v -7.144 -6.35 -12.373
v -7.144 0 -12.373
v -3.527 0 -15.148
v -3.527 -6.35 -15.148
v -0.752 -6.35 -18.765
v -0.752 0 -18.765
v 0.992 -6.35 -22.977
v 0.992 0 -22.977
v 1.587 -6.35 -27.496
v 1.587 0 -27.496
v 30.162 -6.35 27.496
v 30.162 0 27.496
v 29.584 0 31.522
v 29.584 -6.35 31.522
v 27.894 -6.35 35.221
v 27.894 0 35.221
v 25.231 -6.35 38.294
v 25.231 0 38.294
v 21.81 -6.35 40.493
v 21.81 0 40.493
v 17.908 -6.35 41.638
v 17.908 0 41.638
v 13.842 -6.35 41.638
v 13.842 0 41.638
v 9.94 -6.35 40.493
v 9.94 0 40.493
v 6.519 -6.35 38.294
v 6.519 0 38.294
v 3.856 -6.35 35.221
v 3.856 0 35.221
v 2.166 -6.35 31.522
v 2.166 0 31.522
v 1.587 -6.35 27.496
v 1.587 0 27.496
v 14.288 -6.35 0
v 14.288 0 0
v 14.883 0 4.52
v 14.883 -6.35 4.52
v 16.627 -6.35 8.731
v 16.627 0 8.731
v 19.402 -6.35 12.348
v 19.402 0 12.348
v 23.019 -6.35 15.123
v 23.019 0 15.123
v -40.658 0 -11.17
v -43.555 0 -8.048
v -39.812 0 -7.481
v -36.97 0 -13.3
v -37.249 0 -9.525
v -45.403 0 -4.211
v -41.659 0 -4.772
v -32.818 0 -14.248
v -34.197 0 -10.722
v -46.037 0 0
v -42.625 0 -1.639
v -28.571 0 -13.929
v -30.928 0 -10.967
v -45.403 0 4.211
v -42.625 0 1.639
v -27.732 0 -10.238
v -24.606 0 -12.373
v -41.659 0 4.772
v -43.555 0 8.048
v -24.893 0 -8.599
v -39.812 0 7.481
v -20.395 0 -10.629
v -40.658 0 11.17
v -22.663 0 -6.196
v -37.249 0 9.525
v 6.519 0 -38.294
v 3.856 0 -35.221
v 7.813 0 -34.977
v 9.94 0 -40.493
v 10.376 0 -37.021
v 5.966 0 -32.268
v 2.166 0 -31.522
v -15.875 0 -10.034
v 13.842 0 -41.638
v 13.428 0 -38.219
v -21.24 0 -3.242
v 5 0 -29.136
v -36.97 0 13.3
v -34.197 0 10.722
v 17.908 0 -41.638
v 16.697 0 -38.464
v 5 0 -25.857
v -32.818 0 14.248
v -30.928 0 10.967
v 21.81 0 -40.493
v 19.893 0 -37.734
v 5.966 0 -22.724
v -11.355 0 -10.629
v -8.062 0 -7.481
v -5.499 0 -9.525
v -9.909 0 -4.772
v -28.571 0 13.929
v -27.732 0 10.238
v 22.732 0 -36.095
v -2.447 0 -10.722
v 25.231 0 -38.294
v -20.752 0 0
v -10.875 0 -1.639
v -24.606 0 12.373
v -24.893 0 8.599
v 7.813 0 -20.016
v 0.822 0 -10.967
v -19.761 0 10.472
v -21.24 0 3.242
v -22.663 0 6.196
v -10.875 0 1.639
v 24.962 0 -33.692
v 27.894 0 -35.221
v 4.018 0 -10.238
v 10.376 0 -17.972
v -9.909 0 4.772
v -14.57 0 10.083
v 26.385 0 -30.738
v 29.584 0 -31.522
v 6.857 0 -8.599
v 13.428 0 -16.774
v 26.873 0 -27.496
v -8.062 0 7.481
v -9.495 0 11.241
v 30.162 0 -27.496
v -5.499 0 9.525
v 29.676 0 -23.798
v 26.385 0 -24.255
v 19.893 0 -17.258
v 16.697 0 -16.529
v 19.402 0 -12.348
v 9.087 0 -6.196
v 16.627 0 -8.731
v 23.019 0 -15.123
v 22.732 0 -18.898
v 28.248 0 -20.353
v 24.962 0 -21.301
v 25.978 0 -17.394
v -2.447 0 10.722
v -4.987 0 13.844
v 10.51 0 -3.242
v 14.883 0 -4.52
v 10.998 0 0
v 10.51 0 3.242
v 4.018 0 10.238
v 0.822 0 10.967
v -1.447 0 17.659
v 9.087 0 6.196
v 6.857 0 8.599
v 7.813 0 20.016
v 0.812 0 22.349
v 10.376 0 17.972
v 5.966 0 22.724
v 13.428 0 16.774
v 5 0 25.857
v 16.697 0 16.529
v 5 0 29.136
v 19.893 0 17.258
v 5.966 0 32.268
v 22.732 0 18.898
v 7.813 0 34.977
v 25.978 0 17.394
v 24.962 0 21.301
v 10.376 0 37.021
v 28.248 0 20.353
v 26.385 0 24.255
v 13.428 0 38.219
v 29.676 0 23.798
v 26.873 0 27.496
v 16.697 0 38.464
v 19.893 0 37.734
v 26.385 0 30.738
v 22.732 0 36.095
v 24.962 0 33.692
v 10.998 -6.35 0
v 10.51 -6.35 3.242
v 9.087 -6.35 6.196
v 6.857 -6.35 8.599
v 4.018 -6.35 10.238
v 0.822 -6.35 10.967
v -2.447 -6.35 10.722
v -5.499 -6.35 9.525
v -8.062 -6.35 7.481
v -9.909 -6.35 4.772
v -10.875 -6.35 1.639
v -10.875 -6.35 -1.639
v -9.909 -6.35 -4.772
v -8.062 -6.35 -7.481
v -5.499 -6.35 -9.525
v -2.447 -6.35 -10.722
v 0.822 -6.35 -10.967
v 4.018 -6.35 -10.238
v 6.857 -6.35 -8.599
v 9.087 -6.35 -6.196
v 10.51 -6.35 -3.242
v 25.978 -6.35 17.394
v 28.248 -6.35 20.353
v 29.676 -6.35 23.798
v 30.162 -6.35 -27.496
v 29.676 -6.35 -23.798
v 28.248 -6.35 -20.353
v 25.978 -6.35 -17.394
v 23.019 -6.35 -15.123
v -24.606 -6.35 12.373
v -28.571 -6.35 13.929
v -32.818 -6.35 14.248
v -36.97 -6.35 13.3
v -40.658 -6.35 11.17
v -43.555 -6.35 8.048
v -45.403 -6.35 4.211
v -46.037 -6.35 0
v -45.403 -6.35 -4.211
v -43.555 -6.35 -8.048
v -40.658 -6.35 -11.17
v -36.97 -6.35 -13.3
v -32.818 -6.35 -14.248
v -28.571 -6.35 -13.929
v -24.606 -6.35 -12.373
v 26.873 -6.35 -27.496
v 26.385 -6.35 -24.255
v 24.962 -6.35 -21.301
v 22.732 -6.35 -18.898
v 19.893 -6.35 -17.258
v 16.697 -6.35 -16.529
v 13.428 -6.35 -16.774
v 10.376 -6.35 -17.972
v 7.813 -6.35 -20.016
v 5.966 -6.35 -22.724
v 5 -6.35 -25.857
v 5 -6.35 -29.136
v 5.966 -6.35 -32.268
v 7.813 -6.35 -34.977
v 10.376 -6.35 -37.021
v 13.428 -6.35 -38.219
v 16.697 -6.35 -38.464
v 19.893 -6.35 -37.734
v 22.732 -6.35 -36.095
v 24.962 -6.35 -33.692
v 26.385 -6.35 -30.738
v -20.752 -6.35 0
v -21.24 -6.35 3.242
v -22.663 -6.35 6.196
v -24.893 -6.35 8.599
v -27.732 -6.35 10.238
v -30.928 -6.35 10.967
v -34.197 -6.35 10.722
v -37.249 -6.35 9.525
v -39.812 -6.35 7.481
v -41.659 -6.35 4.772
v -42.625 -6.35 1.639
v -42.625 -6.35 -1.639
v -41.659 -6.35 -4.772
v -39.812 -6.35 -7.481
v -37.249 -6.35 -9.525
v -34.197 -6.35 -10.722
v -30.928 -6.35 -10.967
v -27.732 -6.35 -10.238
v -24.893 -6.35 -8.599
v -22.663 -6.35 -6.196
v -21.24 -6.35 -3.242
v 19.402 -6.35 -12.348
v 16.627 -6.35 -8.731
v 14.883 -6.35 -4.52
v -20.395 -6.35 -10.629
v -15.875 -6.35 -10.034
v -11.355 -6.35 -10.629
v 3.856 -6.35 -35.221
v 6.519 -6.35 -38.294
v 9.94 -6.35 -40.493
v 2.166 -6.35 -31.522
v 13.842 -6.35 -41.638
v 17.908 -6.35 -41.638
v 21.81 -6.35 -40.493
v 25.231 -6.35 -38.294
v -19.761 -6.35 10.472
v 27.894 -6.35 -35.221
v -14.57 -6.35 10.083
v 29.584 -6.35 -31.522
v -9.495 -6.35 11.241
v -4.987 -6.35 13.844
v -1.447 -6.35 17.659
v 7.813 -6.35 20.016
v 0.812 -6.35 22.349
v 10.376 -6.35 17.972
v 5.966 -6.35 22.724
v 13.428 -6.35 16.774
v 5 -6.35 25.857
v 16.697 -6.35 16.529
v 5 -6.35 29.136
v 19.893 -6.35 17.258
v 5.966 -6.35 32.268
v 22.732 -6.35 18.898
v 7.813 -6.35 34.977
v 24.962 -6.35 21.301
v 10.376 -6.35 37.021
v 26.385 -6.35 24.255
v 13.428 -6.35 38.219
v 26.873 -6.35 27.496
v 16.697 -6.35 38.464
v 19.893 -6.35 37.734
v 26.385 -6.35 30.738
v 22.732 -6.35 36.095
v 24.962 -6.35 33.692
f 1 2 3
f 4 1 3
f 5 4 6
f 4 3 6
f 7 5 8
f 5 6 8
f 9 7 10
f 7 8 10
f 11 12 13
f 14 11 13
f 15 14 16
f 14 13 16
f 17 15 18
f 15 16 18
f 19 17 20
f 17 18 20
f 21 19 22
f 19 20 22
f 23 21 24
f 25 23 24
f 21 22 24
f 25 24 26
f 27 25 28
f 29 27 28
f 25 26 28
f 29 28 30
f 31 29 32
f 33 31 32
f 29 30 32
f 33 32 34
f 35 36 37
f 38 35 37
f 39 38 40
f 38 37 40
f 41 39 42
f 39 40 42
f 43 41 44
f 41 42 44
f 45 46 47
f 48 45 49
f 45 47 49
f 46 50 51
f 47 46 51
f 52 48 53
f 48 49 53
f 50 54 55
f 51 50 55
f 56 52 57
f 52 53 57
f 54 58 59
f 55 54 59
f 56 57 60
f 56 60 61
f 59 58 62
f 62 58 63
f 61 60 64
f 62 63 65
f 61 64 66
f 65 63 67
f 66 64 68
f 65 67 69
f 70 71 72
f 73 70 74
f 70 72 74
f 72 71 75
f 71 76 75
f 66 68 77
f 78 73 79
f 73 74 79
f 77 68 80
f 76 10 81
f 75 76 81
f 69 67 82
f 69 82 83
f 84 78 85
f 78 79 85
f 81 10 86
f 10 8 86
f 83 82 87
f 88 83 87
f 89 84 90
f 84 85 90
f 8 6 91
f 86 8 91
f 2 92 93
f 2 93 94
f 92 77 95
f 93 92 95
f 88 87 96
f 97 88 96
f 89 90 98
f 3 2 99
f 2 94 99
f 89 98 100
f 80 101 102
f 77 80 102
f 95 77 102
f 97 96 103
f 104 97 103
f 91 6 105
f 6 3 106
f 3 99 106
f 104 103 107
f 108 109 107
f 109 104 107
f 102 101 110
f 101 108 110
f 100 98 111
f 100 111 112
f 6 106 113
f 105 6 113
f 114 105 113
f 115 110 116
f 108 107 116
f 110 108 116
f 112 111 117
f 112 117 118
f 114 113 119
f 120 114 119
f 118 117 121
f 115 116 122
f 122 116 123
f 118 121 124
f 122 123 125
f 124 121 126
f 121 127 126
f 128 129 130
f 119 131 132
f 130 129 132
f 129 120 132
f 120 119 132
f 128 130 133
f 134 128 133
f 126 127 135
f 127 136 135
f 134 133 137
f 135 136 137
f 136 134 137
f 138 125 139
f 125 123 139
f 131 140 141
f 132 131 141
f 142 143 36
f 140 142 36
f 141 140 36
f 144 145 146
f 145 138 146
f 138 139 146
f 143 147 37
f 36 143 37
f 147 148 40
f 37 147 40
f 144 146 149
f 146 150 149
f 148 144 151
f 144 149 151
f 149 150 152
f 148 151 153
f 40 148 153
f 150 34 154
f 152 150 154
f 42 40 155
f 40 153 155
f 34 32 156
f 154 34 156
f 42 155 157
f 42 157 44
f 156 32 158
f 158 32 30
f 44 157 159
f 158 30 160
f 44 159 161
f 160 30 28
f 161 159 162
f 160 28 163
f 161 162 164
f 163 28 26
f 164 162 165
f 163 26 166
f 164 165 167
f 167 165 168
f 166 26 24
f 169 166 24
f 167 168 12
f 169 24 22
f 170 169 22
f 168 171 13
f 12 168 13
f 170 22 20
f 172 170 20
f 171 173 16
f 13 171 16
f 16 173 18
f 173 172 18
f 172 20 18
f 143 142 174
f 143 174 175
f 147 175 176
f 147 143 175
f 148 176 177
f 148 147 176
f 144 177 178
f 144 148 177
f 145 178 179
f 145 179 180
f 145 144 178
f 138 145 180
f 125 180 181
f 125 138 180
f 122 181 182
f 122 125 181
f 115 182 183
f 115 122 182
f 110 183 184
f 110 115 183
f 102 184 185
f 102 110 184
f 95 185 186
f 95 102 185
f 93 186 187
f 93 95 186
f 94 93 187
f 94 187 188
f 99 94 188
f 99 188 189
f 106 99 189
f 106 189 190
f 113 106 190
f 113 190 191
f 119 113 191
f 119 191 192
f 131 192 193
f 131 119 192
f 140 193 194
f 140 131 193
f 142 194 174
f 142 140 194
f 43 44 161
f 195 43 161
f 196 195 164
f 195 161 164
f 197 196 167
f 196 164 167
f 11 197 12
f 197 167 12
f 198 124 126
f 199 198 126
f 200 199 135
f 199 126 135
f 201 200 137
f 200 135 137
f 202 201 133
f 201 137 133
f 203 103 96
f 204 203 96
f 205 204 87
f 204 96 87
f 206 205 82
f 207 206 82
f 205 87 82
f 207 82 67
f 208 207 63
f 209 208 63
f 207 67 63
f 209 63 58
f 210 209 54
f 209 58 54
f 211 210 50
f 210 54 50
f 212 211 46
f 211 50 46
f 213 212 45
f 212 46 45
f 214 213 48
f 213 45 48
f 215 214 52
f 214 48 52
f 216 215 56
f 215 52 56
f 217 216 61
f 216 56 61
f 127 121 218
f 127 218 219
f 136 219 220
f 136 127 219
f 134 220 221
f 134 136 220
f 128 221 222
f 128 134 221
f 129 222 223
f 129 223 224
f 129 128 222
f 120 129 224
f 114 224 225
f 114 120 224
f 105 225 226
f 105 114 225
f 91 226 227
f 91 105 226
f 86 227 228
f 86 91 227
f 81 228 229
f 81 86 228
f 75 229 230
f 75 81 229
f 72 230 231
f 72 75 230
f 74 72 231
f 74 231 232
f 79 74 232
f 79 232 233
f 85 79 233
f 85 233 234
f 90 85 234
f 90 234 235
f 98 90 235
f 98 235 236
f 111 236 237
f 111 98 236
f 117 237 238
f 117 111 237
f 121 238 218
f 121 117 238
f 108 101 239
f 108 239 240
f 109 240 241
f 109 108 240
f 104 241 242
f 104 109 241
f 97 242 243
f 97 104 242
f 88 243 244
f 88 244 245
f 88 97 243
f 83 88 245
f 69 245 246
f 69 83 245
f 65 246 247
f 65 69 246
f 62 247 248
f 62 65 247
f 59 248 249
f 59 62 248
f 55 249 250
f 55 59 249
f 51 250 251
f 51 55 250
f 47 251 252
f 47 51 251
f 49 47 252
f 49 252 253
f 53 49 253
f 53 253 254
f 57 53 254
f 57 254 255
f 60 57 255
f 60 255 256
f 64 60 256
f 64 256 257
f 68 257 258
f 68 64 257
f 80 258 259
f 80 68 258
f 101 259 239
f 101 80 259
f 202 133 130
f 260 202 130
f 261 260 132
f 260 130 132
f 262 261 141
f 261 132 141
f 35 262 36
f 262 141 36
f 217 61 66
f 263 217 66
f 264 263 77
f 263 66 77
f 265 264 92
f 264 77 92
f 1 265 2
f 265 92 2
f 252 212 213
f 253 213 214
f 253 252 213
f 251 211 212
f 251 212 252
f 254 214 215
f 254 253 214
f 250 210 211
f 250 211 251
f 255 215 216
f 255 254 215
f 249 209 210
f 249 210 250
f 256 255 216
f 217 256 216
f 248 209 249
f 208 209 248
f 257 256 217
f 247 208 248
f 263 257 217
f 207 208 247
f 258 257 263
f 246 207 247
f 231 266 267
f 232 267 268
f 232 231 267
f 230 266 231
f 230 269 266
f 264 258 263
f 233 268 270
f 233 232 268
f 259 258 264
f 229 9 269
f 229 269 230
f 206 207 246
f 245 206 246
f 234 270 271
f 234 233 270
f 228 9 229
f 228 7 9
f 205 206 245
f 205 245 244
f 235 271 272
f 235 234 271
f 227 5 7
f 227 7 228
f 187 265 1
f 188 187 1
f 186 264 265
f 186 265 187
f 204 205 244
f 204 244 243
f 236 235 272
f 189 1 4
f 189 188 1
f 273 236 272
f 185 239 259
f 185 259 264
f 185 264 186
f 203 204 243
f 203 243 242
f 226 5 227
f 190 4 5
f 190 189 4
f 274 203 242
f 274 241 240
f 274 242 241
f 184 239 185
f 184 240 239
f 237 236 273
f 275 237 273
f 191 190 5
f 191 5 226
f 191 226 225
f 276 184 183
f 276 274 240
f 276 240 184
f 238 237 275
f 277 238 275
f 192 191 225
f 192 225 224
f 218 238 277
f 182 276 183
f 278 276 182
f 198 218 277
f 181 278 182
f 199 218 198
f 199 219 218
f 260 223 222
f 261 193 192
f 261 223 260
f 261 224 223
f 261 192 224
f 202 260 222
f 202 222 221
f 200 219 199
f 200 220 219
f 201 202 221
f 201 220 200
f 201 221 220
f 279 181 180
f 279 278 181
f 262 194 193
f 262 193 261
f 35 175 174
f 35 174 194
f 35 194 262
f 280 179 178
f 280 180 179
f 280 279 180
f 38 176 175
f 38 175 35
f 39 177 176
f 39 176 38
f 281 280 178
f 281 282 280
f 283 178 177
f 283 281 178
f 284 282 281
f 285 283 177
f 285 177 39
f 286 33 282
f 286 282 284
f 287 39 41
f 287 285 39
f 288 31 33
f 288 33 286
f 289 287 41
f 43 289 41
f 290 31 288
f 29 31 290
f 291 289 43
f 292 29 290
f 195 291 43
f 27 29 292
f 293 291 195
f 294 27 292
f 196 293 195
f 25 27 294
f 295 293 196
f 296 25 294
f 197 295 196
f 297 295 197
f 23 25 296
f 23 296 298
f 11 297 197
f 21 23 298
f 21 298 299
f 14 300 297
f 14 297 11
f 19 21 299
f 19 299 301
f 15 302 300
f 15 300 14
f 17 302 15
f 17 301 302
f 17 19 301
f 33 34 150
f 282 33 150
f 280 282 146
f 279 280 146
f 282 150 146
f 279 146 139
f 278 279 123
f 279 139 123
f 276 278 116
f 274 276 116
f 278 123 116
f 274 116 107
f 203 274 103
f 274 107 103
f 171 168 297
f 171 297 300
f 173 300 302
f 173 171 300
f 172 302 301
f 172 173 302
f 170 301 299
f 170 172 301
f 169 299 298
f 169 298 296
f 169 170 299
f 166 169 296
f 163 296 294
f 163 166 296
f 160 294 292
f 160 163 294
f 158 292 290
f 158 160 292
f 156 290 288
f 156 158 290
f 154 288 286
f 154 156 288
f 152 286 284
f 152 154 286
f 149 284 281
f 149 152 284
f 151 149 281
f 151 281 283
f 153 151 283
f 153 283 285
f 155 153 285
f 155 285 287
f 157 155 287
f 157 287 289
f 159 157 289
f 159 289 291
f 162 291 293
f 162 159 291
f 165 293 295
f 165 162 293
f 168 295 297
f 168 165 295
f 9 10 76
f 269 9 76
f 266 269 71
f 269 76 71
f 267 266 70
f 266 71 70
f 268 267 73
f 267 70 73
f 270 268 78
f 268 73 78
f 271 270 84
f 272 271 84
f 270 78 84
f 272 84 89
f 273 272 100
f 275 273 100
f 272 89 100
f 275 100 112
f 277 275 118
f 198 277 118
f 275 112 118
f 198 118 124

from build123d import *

# Parameters (mm, degrees)
F0_R     = 10.9982
F1_DEPTH = 6.35


with BuildPart() as f1:
    # F0 (on Front) → F1 (new body)
    with BuildSketch(Plane.XZ):
        with BuildLine():
            ThreePointArc((-7.1437498937, -12.3733380179), (7.1437500531, -12.3733379259), (14.2875, 0))
            ThreePointArc((14.2875, 0), (7.1437499995, 12.3733379569), (-7.143750001, 12.373337956))
            ThreePointArc((-7.143750001, 12.373337956), (-14.2875, -6.19e-08), (-7.1437498937, -12.3733380179))
        make_face()
        Circle(F0_R, mode=Mode.SUBTRACT)
        with BuildLine():
            ThreePointArc((23.01875, -15.1229686136), (16.6270313864, -8.73125), (14.2875, 0))
            ThreePointArc((14.2875, 0), (7.1437500531, -12.3733379259), (-7.1437498937, -12.3733380179))
            ThreePointArc((-7.1437498937, -12.3733380179), (-0.7520313557, -18.7650566233), (1.5875, -27.4963065702))
            ThreePointArc((1.5875, -27.4963065702), (8.73125, -15.1229686136), (23.01875, -15.1229686136))
        make_face()
        with BuildLine():
            ThreePointArc((-7.143750001, 12.373337956), (7.1437499995, 12.3733379569), (14.2875, 0))
            ThreePointArc((14.2875, 0), (16.6270313864, 8.73125), (23.01875, 15.1229686136))
            ThreePointArc((23.01875, 15.1229686136), (8.73125, 15.1229686136), (1.5875, 27.4963065702))
            ThreePointArc((1.5875, 27.4963065702), (-0.7520313867, 18.7650565696), (-7.143750001, 12.373337956))
        make_face()
        with BuildLine():
            ThreePointArc((-7.1437498937, -12.3733380179), (-14.2875, -6.19e-08), (-7.143750001, 12.373337956))
            ThreePointArc((-7.143750001, 12.373337956), (-15.8750000006, 10.0338065702), (-24.60625, 12.3733379566))
            ThreePointArc((-24.60625, 12.3733379566), (-19.3766620434, 7.14375), (-17.4625, 0))
            ThreePointArc((-17.4625, 0), (-19.3766620434, -7.14375), (-24.60625, -12.3733379566))
            ThreePointArc((-24.60625, -12.3733379566), (-15.8749999387, -10.0338065702), (-7.1437498937, -12.3733380179))
        make_face()
        with BuildLine():
            ThreePointArc((1.5875, 27.4963065702), (8.73125, 15.1229686136), (23.01875, 15.1229686136))
            ThreePointArc((23.01875, 15.1229686136), (28.2483379566, 20.3525565702), (30.1625, 27.4963065702))
            ThreePointArc((30.1625, 27.4963065702), (15.875, 41.7838065702), (1.5875, 27.4963065702))
        make_face()
        with Locations((15.875, 27.4963065702)):
            Circle(F0_R, mode=Mode.SUBTRACT)
        with BuildLine():
            ThreePointArc((30.1625, -27.4963065702), (28.2483379566, -20.3525565702), (23.01875, -15.1229686136))
            ThreePointArc((23.01875, -15.1229686136), (8.73125, -15.1229686136), (1.5875, -27.4963065702))
            ThreePointArc((1.5875, -27.4963065702), (15.875, -41.7838065702), (30.1625, -27.4963065702))
        make_face()
        with Locations((15.875, -27.4963065702)):
            Circle(F0_R, mode=Mode.SUBTRACT)
        with BuildLine():
            ThreePointArc((-17.4625, 0), (-19.3766620434, 7.14375), (-24.60625, 12.3733379566))
            ThreePointArc((-24.60625, 12.3733379566), (-46.0375, 0), (-24.60625, -12.3733379566))
            ThreePointArc((-24.60625, -12.3733379566), (-19.3766620434, -7.14375), (-17.4625, 0))
        make_face()
        with Locations((-31.75, 0)):
            Circle(F0_R, mode=Mode.SUBTRACT)
    extrude(amount=F1_DEPTH)


solid = f1.part
